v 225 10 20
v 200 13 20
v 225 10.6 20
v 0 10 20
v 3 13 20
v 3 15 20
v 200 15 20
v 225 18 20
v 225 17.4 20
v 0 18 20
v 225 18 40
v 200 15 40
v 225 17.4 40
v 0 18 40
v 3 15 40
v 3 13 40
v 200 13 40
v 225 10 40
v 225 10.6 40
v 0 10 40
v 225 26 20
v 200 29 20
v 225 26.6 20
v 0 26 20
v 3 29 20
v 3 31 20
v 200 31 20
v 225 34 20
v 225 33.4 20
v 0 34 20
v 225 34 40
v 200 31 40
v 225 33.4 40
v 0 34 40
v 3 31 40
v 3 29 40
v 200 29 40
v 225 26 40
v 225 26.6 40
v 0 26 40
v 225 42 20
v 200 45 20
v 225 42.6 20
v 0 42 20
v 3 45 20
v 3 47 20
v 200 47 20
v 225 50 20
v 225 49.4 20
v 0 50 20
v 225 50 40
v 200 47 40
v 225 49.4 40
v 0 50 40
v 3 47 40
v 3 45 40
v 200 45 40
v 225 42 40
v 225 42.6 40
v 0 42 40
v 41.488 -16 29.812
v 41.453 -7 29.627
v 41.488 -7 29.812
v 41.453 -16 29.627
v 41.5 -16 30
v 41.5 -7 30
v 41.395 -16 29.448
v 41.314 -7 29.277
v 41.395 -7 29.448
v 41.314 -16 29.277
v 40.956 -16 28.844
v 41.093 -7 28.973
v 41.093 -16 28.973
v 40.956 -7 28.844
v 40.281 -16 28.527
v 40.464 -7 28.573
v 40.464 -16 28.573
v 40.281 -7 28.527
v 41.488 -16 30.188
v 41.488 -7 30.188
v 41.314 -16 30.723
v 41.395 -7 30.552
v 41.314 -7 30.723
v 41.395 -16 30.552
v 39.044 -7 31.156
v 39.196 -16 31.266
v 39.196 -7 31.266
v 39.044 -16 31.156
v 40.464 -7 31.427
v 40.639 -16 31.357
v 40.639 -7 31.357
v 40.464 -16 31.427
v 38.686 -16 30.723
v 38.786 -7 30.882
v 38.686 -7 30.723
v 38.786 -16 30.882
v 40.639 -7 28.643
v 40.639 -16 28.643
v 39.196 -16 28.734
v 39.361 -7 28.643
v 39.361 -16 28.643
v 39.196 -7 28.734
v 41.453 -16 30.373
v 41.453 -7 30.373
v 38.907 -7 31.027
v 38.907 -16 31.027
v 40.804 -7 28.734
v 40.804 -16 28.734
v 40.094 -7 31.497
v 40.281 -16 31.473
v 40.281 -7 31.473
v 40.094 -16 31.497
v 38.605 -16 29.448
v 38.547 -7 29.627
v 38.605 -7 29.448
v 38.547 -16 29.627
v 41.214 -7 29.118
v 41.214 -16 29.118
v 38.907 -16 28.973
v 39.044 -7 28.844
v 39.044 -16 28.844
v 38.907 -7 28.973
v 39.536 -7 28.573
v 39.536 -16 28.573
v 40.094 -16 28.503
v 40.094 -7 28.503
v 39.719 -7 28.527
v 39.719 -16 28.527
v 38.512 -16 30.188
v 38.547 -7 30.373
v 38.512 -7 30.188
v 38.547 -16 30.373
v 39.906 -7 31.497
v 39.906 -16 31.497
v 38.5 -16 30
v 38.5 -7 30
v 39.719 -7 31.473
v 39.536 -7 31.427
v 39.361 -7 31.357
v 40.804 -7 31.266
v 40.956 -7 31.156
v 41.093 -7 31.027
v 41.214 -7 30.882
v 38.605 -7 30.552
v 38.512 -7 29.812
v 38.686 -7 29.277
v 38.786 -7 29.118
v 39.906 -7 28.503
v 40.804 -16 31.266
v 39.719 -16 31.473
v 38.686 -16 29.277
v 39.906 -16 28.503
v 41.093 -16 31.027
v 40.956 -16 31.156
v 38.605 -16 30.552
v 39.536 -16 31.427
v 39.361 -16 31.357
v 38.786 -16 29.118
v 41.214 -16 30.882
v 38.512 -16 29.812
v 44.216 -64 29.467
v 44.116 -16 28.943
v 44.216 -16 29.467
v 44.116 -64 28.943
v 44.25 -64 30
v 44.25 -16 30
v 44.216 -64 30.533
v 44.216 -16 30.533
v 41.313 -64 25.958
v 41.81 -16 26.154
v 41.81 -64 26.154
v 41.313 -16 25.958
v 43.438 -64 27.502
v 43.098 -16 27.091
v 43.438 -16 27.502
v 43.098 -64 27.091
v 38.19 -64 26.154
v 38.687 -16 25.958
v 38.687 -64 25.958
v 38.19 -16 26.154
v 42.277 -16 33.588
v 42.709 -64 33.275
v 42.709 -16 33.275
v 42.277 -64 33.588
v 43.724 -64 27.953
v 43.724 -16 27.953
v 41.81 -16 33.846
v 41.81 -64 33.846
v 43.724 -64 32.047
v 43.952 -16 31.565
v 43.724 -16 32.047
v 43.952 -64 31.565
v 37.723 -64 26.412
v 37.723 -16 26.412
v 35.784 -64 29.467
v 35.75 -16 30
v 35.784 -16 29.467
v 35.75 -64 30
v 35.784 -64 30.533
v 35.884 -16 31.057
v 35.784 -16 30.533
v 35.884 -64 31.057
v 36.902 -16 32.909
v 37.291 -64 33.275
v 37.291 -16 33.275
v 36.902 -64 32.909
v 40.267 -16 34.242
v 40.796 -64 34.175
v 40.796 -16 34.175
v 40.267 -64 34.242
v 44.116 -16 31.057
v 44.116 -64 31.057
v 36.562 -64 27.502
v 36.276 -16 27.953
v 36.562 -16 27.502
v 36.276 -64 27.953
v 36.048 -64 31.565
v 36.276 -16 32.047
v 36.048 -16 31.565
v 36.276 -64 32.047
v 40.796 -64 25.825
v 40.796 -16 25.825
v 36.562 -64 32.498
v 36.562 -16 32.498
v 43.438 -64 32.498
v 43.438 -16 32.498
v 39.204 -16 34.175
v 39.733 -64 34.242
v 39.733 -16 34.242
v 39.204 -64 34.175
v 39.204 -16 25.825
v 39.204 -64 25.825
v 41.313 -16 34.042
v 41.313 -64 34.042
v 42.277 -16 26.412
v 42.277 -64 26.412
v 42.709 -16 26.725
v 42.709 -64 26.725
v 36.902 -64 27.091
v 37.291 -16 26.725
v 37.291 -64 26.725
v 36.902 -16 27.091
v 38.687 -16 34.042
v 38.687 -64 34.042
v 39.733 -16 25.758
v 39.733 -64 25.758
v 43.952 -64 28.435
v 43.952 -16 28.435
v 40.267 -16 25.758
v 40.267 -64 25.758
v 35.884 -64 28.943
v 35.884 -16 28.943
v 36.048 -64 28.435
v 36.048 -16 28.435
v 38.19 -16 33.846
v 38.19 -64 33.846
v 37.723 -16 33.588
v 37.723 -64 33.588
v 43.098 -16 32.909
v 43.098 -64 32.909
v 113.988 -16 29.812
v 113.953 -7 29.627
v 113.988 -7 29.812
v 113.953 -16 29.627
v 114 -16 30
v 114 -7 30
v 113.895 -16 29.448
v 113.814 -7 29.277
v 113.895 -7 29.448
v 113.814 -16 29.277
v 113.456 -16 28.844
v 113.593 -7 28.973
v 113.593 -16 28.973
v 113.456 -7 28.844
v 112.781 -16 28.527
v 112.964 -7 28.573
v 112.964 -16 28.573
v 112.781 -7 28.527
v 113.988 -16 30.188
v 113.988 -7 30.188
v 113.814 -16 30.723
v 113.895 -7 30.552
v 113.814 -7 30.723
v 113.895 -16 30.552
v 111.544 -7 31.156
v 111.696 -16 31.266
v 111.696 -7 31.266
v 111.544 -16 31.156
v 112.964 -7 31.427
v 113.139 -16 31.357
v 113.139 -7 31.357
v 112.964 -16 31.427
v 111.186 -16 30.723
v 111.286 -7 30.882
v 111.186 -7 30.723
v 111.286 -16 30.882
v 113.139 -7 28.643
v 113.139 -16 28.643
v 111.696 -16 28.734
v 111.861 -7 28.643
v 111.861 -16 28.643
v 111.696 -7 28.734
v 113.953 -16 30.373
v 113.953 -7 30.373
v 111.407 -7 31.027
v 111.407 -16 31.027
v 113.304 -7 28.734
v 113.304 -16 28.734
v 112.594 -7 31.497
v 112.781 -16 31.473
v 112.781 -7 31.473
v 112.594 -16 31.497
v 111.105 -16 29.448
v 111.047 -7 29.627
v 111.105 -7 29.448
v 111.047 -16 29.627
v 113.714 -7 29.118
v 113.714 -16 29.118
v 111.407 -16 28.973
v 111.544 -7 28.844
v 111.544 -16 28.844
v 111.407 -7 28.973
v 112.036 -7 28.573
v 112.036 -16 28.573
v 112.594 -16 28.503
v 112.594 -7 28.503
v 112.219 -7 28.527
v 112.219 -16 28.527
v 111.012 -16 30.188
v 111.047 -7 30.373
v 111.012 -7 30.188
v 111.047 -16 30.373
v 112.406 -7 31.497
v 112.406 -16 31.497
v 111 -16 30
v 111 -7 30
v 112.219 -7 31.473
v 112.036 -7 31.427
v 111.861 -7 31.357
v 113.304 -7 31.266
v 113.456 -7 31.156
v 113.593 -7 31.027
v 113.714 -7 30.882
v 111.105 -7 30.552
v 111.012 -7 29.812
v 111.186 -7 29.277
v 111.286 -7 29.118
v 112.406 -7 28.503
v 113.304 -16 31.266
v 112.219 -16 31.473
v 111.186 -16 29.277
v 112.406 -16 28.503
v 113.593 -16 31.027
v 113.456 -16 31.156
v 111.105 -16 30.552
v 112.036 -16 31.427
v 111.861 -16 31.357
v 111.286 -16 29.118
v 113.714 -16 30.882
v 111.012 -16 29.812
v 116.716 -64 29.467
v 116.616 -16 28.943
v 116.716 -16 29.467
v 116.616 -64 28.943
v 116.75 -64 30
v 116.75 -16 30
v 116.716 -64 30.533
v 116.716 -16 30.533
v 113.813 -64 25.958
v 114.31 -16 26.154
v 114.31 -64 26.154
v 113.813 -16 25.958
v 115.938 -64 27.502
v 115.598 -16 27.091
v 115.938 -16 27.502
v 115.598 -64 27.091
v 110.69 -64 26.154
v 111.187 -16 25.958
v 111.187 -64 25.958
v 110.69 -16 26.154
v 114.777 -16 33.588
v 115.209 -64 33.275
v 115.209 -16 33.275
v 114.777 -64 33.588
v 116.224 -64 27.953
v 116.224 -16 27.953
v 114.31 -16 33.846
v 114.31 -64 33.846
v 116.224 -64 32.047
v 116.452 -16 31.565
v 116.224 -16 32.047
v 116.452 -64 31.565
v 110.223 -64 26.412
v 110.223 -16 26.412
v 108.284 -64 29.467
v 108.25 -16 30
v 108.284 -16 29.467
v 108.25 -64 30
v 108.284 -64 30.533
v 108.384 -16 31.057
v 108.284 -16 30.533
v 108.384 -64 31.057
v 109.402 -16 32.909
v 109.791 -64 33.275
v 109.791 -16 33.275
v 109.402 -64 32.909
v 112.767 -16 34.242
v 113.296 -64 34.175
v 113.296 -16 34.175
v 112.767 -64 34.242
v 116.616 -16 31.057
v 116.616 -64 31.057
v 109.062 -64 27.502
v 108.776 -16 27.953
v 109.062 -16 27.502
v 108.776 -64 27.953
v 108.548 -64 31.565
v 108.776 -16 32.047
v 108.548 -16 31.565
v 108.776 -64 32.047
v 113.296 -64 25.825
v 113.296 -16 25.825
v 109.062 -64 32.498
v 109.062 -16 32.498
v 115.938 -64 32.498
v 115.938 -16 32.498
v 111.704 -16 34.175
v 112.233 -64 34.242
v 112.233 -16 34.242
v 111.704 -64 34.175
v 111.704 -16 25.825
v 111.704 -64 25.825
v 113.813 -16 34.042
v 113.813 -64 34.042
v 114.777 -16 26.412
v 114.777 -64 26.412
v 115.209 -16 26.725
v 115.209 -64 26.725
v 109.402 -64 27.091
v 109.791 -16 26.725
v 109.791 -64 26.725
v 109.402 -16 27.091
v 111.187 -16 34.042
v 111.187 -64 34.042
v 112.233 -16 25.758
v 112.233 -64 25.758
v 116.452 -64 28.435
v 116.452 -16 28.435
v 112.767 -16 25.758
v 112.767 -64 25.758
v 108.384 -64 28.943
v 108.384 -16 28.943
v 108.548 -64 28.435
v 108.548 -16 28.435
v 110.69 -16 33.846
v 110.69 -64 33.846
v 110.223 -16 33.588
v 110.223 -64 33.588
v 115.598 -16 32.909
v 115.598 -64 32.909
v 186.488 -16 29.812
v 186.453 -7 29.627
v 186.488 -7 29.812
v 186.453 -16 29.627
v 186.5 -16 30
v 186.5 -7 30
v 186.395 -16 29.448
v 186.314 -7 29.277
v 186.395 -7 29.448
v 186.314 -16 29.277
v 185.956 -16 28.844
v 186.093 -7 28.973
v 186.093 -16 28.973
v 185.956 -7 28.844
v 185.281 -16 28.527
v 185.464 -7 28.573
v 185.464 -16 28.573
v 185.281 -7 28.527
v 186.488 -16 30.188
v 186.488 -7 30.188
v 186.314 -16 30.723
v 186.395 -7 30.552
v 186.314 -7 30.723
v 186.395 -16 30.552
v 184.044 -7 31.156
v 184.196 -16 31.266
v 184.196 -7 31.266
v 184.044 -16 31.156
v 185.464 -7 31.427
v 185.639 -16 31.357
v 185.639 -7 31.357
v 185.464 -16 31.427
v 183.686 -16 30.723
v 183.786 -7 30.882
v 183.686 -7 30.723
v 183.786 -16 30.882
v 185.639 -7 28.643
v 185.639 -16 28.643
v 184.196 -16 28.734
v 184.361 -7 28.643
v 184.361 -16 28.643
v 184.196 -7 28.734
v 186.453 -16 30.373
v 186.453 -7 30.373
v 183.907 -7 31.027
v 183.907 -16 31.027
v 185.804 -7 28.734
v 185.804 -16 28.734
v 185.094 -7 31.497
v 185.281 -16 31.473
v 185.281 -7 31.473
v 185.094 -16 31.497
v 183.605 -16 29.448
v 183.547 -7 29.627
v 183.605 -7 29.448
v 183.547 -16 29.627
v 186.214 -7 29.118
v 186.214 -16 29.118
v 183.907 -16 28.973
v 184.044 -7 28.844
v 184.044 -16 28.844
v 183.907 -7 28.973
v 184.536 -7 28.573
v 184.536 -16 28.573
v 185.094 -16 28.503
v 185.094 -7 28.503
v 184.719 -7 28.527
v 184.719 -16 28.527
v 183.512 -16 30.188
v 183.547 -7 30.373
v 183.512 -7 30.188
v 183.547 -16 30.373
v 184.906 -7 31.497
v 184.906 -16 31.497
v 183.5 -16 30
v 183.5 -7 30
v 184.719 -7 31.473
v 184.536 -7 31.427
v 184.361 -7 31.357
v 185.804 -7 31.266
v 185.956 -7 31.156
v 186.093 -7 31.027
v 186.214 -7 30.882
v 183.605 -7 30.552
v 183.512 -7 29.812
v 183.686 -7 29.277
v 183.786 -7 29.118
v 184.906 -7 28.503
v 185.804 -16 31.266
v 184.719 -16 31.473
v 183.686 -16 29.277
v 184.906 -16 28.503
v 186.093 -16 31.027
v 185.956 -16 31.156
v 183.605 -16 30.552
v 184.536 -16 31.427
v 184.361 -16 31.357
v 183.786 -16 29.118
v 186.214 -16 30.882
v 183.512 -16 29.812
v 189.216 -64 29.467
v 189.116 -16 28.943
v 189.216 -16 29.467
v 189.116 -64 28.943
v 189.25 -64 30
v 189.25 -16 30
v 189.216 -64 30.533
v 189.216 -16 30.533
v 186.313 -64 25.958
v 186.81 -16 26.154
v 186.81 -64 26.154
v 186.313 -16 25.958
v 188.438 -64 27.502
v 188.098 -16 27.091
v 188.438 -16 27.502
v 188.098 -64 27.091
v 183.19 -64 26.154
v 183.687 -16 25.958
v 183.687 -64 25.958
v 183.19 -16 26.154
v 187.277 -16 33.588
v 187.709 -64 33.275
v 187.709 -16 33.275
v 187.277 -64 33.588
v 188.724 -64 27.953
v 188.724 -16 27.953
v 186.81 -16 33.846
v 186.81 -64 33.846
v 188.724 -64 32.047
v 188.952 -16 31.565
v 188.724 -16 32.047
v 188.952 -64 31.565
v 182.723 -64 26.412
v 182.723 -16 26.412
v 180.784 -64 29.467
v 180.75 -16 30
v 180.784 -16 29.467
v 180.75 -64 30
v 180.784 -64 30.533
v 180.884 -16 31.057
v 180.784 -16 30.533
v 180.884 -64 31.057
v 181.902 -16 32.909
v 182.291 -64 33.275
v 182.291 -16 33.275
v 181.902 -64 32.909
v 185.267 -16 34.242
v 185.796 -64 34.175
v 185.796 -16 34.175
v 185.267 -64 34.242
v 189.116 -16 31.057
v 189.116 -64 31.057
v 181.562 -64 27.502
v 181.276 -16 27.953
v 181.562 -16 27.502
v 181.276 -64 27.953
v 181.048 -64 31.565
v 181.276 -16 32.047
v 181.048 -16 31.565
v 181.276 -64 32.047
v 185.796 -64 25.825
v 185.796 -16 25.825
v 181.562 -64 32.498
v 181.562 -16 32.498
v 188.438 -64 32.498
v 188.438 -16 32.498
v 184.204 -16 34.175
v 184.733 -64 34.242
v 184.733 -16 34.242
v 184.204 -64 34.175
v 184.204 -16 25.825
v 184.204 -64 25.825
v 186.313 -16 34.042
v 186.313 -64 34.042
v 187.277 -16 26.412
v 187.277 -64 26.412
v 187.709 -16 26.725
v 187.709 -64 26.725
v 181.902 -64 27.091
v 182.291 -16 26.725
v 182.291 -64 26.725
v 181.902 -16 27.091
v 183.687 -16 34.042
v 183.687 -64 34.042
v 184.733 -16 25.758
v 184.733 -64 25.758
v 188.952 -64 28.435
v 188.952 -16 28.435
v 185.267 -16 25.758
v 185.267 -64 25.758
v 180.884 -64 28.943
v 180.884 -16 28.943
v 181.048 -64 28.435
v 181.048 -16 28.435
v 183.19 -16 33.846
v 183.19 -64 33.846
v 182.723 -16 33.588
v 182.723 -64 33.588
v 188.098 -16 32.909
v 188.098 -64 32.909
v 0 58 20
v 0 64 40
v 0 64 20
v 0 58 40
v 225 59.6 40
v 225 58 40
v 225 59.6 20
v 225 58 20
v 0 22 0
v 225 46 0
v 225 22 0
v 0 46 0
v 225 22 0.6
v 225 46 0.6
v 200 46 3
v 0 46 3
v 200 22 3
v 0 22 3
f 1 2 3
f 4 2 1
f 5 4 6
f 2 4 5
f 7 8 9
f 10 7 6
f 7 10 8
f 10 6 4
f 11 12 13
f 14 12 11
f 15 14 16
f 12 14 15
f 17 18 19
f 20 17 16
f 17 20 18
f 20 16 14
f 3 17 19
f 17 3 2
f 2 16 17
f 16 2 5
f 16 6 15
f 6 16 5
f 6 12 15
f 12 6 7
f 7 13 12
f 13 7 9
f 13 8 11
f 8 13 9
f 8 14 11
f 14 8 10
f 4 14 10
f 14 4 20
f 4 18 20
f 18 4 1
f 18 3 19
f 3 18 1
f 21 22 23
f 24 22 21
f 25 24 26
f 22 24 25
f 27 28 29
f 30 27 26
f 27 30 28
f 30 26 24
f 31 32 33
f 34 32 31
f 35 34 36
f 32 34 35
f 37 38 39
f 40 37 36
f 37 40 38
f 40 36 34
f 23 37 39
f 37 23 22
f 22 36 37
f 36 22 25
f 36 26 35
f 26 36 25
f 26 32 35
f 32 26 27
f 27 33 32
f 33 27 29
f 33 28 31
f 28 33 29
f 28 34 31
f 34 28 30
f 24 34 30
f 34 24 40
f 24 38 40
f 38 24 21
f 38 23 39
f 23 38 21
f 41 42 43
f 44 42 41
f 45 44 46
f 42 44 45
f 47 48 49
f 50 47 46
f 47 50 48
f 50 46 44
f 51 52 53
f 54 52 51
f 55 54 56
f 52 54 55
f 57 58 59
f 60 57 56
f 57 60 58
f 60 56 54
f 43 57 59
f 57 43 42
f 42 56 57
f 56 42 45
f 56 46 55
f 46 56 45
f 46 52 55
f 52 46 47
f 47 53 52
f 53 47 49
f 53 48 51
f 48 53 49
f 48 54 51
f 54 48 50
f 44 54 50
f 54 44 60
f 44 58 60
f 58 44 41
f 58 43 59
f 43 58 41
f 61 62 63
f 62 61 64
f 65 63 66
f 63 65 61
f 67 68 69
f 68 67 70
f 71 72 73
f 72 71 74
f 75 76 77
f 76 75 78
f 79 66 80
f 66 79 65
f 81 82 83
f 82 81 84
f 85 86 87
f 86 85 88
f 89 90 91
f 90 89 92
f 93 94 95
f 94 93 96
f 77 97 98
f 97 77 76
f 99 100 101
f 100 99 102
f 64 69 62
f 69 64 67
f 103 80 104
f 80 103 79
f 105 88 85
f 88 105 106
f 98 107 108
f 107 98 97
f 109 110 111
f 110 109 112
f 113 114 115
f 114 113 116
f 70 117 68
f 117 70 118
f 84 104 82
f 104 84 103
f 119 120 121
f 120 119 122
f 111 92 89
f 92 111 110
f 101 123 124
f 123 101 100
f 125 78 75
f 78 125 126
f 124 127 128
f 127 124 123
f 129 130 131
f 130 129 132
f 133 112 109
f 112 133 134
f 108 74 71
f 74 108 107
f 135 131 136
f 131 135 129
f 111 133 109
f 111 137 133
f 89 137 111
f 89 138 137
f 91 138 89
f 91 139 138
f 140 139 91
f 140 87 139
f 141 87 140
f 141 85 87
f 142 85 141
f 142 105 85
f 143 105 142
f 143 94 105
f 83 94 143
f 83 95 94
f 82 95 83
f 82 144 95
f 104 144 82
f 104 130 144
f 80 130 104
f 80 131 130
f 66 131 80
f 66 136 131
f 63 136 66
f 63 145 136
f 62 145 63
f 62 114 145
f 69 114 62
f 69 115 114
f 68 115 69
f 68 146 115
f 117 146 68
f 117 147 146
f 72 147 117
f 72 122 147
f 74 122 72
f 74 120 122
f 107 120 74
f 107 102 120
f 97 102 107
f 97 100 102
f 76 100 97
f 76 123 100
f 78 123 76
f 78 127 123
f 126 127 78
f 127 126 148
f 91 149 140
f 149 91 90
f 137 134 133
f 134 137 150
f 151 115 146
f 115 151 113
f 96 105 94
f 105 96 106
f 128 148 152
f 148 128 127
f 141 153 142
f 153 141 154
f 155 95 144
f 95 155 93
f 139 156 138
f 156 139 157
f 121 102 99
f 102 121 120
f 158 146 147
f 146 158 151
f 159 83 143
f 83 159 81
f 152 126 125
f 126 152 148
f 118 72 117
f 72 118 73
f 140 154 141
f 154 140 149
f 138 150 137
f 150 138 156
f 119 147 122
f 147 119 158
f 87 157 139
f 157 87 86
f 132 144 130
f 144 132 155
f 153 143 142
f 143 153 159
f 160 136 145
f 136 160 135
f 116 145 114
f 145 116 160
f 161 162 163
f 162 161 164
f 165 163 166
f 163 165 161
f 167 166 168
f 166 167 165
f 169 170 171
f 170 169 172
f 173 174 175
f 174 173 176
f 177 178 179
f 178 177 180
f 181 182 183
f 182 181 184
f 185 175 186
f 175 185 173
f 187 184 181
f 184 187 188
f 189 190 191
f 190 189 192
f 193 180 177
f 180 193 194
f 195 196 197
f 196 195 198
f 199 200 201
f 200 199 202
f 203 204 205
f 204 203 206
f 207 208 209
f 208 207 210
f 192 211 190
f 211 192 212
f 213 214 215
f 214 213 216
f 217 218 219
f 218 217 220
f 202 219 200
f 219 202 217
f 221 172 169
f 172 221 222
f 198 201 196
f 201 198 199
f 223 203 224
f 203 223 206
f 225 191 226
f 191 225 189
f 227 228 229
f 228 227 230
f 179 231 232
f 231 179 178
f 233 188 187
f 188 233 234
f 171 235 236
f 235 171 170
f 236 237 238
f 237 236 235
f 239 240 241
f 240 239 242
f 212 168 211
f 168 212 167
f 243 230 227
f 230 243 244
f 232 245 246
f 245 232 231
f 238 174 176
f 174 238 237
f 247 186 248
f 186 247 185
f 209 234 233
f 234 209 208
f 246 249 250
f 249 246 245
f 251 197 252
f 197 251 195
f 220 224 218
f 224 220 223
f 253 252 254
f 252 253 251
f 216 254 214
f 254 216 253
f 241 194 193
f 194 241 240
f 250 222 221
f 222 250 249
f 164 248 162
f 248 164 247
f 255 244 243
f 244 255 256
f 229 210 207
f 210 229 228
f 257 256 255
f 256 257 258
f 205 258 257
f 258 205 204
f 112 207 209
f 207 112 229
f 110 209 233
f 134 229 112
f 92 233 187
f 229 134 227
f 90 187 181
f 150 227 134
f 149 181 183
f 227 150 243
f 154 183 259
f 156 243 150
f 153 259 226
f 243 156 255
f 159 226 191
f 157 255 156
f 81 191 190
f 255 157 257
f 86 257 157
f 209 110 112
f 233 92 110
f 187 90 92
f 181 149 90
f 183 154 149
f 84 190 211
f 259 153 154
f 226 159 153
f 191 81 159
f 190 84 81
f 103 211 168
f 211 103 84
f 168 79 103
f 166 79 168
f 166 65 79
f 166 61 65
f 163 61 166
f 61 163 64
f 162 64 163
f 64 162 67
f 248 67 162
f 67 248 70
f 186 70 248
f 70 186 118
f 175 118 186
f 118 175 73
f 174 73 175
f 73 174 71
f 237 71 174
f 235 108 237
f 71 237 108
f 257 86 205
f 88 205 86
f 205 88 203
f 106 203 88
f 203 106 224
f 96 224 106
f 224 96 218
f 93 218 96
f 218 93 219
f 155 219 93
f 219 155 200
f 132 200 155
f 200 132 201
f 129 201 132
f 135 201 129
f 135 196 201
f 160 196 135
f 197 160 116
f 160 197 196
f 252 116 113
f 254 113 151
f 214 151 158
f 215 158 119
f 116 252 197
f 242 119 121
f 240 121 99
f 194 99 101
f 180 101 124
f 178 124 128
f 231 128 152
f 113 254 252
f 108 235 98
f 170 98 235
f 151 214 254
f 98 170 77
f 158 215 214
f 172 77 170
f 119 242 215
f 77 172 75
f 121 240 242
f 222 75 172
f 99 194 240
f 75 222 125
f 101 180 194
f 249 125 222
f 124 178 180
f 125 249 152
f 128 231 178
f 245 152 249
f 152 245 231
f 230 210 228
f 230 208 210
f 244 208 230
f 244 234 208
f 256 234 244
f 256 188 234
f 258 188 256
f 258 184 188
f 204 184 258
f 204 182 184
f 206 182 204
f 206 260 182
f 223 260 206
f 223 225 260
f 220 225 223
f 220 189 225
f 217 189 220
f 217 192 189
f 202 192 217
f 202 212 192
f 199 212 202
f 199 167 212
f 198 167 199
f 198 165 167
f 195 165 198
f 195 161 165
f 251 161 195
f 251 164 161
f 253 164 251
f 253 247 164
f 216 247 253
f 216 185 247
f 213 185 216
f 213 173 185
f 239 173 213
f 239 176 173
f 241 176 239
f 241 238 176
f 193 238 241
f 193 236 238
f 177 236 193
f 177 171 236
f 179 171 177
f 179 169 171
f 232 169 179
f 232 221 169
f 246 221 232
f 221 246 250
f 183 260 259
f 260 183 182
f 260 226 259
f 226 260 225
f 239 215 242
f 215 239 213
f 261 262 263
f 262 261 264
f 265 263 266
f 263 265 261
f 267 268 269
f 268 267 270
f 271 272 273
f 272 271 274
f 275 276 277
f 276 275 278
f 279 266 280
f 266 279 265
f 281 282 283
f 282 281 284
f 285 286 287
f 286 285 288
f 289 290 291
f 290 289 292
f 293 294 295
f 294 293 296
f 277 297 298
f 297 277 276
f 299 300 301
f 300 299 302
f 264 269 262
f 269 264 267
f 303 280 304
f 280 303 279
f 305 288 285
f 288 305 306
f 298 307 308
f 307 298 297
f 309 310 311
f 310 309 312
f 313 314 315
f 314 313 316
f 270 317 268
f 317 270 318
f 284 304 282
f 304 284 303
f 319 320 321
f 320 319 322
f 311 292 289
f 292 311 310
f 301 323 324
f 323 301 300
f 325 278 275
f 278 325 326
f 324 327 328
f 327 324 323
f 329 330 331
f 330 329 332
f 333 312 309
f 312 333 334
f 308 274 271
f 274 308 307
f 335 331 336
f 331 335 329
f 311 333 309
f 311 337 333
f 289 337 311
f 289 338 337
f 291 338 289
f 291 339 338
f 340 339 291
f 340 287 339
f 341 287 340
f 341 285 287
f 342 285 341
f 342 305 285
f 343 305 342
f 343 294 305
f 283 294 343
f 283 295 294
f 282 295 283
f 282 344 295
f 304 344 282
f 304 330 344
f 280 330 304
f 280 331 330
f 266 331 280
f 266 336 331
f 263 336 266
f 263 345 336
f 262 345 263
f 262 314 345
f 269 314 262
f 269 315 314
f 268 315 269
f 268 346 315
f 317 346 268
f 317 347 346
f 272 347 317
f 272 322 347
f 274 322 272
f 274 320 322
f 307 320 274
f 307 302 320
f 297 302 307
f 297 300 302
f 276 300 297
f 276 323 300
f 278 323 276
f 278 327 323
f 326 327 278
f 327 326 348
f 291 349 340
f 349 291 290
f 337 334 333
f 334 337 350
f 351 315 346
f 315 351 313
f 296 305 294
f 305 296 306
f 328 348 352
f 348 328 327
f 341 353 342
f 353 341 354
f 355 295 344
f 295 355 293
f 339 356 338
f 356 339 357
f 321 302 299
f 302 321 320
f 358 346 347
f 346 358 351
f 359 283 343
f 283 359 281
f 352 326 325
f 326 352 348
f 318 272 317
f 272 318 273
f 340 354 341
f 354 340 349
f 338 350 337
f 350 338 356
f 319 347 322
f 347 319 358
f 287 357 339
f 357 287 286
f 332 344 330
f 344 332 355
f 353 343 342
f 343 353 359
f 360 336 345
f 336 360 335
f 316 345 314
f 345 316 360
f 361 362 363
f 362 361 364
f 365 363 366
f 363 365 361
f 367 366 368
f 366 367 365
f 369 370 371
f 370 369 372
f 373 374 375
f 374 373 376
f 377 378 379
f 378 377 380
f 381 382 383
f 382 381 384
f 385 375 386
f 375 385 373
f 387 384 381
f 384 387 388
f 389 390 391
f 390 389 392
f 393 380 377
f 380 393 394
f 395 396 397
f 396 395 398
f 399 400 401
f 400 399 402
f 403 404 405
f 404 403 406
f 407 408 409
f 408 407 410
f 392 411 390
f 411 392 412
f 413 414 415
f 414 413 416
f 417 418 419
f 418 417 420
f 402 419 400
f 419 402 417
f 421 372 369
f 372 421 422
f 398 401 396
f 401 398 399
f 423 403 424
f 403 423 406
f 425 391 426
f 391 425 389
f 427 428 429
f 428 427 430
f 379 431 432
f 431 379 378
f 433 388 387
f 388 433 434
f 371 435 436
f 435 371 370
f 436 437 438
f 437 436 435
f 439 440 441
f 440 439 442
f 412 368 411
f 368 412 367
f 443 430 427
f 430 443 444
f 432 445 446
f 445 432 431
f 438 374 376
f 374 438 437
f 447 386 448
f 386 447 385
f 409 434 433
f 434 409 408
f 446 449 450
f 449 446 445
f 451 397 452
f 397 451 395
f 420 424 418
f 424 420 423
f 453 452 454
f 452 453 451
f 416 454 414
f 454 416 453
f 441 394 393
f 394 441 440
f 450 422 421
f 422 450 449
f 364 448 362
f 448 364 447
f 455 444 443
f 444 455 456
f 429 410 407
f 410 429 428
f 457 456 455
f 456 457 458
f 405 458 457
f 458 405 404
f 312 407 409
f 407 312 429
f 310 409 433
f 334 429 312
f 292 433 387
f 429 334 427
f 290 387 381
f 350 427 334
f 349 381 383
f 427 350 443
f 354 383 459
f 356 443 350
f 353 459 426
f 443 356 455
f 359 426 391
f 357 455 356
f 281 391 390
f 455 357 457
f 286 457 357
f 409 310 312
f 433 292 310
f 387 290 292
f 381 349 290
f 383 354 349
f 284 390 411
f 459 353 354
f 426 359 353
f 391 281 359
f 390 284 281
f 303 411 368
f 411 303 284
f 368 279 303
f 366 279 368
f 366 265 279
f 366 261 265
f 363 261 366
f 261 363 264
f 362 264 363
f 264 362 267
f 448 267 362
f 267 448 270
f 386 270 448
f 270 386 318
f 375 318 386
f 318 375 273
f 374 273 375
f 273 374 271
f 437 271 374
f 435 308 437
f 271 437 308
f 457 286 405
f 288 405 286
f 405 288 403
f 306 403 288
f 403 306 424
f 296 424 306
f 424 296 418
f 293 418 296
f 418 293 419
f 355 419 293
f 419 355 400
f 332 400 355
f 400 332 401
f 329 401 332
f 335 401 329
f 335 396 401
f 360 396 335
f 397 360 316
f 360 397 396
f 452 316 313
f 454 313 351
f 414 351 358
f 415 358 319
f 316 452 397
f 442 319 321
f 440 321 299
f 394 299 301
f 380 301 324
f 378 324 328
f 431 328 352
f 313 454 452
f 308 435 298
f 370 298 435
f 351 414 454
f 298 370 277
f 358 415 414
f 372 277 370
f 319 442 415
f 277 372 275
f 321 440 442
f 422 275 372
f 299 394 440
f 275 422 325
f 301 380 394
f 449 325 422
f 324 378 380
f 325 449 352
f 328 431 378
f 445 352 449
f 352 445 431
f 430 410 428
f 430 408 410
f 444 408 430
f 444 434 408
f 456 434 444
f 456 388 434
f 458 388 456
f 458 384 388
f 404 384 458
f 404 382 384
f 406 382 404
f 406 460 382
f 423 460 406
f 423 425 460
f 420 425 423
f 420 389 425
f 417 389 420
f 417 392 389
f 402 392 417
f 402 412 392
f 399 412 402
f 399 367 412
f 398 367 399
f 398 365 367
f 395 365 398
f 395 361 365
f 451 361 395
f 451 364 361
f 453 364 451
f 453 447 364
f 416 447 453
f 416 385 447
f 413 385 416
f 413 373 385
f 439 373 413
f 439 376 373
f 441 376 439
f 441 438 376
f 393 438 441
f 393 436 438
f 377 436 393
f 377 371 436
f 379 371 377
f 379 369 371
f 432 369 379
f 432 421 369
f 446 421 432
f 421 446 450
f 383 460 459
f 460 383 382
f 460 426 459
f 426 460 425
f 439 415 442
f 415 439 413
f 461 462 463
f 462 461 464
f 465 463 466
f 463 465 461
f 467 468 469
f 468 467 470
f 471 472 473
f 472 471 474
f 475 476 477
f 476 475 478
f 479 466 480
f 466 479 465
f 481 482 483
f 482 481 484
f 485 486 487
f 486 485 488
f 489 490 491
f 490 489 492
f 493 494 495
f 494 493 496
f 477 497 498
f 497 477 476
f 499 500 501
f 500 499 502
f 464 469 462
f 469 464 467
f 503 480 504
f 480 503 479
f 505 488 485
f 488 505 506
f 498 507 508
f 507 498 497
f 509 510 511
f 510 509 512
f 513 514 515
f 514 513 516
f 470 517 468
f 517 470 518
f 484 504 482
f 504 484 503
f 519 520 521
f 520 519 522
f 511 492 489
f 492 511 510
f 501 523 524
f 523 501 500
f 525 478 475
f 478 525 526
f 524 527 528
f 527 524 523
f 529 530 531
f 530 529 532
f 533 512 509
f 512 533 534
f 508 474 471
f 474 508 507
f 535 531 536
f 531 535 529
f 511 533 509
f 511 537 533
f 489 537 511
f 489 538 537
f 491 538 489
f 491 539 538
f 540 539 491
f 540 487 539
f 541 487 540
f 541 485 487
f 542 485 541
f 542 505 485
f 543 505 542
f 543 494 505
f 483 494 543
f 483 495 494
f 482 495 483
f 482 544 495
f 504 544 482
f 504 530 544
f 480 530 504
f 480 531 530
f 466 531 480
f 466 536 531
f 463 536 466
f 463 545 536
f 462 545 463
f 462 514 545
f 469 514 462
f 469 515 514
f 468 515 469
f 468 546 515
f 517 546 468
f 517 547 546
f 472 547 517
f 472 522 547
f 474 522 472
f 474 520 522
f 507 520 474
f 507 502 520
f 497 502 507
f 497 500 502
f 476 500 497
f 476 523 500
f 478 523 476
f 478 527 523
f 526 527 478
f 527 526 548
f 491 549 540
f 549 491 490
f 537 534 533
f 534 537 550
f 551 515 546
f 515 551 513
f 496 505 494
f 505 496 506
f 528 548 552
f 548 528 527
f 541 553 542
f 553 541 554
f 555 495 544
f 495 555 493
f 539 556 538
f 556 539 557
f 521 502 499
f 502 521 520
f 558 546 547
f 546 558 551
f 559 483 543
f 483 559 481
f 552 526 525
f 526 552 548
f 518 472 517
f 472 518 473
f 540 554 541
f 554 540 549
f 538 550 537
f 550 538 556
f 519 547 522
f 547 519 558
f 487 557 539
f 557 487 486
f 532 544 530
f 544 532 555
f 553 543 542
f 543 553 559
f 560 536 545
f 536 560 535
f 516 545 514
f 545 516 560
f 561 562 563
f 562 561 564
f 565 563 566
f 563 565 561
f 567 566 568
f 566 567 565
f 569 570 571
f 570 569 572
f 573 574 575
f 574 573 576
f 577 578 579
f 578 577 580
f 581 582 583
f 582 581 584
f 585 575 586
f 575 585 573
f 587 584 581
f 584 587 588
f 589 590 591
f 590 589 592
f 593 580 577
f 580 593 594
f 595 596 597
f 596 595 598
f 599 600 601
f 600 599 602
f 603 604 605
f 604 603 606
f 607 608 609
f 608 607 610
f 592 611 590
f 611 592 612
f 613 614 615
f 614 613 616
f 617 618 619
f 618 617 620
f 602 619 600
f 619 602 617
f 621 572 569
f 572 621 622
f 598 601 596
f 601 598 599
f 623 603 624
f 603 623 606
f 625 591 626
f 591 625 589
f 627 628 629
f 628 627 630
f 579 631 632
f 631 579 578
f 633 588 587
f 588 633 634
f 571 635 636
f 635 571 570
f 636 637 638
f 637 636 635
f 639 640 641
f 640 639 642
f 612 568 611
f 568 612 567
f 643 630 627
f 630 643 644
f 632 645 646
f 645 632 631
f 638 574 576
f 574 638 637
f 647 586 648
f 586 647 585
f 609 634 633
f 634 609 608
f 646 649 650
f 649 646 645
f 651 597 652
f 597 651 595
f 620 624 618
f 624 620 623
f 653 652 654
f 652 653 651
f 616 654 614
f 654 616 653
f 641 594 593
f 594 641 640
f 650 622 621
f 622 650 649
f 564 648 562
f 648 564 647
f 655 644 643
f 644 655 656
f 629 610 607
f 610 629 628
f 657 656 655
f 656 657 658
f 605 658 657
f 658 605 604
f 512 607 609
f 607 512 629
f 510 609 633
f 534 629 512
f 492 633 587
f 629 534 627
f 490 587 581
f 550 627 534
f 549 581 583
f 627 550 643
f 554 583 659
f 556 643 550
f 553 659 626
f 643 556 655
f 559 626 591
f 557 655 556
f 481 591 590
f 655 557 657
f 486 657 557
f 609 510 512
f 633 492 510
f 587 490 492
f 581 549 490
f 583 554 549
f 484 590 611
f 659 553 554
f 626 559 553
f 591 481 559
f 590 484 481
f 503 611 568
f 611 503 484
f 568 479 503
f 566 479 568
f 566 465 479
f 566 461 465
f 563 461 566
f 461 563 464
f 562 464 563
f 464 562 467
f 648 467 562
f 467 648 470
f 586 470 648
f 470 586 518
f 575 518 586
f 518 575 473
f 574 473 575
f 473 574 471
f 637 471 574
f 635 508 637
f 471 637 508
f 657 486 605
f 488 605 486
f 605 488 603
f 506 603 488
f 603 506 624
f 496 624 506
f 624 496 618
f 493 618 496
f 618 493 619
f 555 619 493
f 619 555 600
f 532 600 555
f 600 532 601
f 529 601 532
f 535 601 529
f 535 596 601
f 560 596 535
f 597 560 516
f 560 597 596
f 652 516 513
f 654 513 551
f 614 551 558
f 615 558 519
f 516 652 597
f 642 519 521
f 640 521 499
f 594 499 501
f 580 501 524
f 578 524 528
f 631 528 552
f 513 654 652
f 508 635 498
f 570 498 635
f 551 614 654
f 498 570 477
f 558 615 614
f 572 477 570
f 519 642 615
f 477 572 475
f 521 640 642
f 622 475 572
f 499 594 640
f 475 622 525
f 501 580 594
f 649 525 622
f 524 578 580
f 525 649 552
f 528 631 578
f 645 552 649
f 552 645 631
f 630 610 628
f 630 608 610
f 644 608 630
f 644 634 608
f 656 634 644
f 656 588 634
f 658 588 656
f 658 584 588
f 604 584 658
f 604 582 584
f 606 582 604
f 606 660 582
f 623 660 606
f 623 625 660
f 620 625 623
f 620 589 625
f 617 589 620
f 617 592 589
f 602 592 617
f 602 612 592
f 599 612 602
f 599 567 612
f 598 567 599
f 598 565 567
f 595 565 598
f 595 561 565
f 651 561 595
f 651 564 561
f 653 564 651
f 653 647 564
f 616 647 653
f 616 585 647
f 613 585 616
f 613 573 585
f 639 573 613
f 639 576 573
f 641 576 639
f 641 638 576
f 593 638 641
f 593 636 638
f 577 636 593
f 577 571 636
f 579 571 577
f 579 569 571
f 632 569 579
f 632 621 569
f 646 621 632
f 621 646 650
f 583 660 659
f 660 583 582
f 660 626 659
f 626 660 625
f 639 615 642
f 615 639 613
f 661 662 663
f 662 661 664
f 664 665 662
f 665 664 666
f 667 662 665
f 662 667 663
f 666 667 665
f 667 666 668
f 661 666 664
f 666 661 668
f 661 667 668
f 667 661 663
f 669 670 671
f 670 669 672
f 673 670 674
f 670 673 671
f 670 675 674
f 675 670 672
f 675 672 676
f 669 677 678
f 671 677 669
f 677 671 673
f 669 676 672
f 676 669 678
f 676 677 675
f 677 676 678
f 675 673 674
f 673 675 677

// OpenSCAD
// Parameterizable Sheet Holder by Michael Gebis
// ivymike at gmail and twitter. I'd love to hear from you!

// Design based on "Best PEI Sheet Holder for ikea lack" by Elod_HU
// https://www.printables.com/model/90215-best-pei-sheet-holder-for-ikea-lack

// To the extent possible under law, the author(s) have dedicated all
// copyright and related and neighboring rights to this software to the
// public domain worldwide. This software is distributed without any
// warranty. Use at your own risk!

// I ask but do not require that you credit me if you use or remix this. Thank you!

// Remember to keep space for future expansion.
NUM_SLOTS               = 3;

// For more flexible printing, run this twice and create two stls.
DO_RIGHT                = true;
DO_LEFT                 = false;
DO_CENTER_HOLE          = true;

SLOT_HEIGHT_MM          = 2.0;      // Measure your thickest sheet, add around .5 mm

// Finer customization variables with reasonable defaults.
SLOT_SUPPORT_HEIGHT_MM  = 3;        // The size of the support below and top of each slot
WALL_MM                 = 3;        // The size of the wall
WIDTH_MM                = 20;       // The width of each support
LENGTH_MM               = 225;      // Prusa MK3S = 225
RAMP_LENGTH_MM          = 25;       
WEDGE_REAR_HEIGHT_MM    = 6;        // Gives "tilt" towards the back so sheets don't slide out
WEDGE_FRONT_HEIGHT_MM   = 1;        // Add a little clearance for the screw head

// Approximate size for a #6 pan head metal screw. But *please* measure your
// actual screws; an improperly recessed screw could scratch the top sheet!
SCREW_HEAD_DIA_MM       = 8.5;
SCREW_HEAD_HEIGHT_MM    = 3;
SCREW_HOLE_DIA_MM       = 3;

REAR_HOLE_OFFSET_MM     = 40;       // Offset from rear
FRONT_HOLE_OFFSET_MM    = 40;       // Offset from front

BLUNTING_MM             = .6;       // Should be >= your nozzle width, plus maybe a little more
$fn                     = 50;       // How smooth to make the circular holes.
eps                     = .0001;    // epsilon, used to avoid coincident faces

function get_single_slot_height() = 2*(SLOT_HEIGHT_MM+(SLOT_SUPPORT_HEIGHT_MM*2));
function get_height() = NUM_SLOTS*get_single_slot_height();

module create_wall() {
    translate([0,get_height()*.75,0]) {
        rotate([90,0,0]) {
            linear_extrude(get_height() / 2) {                
                polygon(
                    [
                        [0, 0],
                        [LENGTH_MM, 0],
                        [LENGTH_MM, BLUNTING_MM],
                        [LENGTH_MM-RAMP_LENGTH_MM, WALL_MM],
                        [0, WALL_MM]
                    ]
                );
            };
        };
    };
}

module create_single_slot(slot) {
    translate([0, (get_single_slot_height()-eps)*slot, 20]) {
        linear_extrude(WIDTH_MM, convexity=4) {
            polygon(
                points=[
                    [0,0],
                    [LENGTH_MM, 0],
                    [LENGTH_MM, BLUNTING_MM],
                    [LENGTH_MM-RAMP_LENGTH_MM, SLOT_SUPPORT_HEIGHT_MM],
                    [WALL_MM, SLOT_SUPPORT_HEIGHT_MM],
                    [WALL_MM, SLOT_SUPPORT_HEIGHT_MM+SLOT_HEIGHT_MM],
                    [LENGTH_MM-RAMP_LENGTH_MM, SLOT_SUPPORT_HEIGHT_MM + SLOT_HEIGHT_MM],
                    [LENGTH_MM, SLOT_SUPPORT_HEIGHT_MM*2 + SLOT_HEIGHT_MM - BLUNTING_MM],
                    [LENGTH_MM, SLOT_SUPPORT_HEIGHT_MM*2 + SLOT_HEIGHT_MM],
                    [0, SLOT_SUPPORT_HEIGHT_MM*2+SLOT_HEIGHT_MM]
                ],
                convexity=2 // For proper preview rendering
            );

        };
    };
}

module create_top_wedge() {
    translate([0, get_height()-eps*NUM_SLOTS, 20]) {
        linear_extrude(WIDTH_MM) {
            polygon(
                [
                    [0,0],
                    [LENGTH_MM, 0],
                    [LENGTH_MM, BLUNTING_MM + WEDGE_FRONT_HEIGHT_MM],
                    [0, WEDGE_REAR_HEIGHT_MM]
                ]
            );
        };
    };
}

module create_single_hole() {
    rotate([270, 0, 0]) {
        cylinder(h=WEDGE_REAR_HEIGHT_MM * 2, d=SCREW_HOLE_DIA_MM);
        translate([0, 0, -1*get_height() + SCREW_HEAD_HEIGHT_MM] ) {
            cylinder(h=get_height()*1, d=SCREW_HEAD_DIA_MM);
        };
    };
};

module create_holes() {
    // Rear
    translate([REAR_HOLE_OFFSET_MM, get_height()/2-SLOT_SUPPORT_HEIGHT_MM, WIDTH_MM/2,]) {
        create_single_hole();
    };

    // Center
    CENTER_HOLE_OFFSET_MM = (REAR_HOLE_OFFSET_MM + LENGTH_MM - FRONT_HOLE_OFFSET_MM)/2;
    translate([CENTER_HOLE_OFFSET_MM, get_height()/2-SLOT_SUPPORT_HEIGHT_MM, WIDTH_MM/2,]) {
        create_single_hole();
    };
  
    // Front
    translate([LENGTH_MM - FRONT_HOLE_OFFSET_MM, get_height()/2-SLOT_SUPPORT_HEIGHT_MM, WIDTH_MM/2,]) {
        create_single_hole();
    };
}

module create_right_holder() {
    translate([0, 10, 0]) {
        difference() {
            union() {
                for (slot = [0 : NUM_SLOTS-1]) {
                    create_single_slot(slot);
                }
                create_top_wedge();
                create_wall();
                translate([0, -50, 20])
                            create_holes();

            };
            //create_holes();
        };
    };
}

module create_left_holder() {
    // Let's hear it for mirror()!
    mirror([0, 1, 0]) {
        create_right_holder();
    };
}

module main() {
    if (DO_LEFT) {
        echo("Creating left holder...");
        create_left_holder();
    }

    if (DO_RIGHT) {
        echo("Creating right holder...");
        create_right_holder();
    };
    echo("Done!");
}

main();
